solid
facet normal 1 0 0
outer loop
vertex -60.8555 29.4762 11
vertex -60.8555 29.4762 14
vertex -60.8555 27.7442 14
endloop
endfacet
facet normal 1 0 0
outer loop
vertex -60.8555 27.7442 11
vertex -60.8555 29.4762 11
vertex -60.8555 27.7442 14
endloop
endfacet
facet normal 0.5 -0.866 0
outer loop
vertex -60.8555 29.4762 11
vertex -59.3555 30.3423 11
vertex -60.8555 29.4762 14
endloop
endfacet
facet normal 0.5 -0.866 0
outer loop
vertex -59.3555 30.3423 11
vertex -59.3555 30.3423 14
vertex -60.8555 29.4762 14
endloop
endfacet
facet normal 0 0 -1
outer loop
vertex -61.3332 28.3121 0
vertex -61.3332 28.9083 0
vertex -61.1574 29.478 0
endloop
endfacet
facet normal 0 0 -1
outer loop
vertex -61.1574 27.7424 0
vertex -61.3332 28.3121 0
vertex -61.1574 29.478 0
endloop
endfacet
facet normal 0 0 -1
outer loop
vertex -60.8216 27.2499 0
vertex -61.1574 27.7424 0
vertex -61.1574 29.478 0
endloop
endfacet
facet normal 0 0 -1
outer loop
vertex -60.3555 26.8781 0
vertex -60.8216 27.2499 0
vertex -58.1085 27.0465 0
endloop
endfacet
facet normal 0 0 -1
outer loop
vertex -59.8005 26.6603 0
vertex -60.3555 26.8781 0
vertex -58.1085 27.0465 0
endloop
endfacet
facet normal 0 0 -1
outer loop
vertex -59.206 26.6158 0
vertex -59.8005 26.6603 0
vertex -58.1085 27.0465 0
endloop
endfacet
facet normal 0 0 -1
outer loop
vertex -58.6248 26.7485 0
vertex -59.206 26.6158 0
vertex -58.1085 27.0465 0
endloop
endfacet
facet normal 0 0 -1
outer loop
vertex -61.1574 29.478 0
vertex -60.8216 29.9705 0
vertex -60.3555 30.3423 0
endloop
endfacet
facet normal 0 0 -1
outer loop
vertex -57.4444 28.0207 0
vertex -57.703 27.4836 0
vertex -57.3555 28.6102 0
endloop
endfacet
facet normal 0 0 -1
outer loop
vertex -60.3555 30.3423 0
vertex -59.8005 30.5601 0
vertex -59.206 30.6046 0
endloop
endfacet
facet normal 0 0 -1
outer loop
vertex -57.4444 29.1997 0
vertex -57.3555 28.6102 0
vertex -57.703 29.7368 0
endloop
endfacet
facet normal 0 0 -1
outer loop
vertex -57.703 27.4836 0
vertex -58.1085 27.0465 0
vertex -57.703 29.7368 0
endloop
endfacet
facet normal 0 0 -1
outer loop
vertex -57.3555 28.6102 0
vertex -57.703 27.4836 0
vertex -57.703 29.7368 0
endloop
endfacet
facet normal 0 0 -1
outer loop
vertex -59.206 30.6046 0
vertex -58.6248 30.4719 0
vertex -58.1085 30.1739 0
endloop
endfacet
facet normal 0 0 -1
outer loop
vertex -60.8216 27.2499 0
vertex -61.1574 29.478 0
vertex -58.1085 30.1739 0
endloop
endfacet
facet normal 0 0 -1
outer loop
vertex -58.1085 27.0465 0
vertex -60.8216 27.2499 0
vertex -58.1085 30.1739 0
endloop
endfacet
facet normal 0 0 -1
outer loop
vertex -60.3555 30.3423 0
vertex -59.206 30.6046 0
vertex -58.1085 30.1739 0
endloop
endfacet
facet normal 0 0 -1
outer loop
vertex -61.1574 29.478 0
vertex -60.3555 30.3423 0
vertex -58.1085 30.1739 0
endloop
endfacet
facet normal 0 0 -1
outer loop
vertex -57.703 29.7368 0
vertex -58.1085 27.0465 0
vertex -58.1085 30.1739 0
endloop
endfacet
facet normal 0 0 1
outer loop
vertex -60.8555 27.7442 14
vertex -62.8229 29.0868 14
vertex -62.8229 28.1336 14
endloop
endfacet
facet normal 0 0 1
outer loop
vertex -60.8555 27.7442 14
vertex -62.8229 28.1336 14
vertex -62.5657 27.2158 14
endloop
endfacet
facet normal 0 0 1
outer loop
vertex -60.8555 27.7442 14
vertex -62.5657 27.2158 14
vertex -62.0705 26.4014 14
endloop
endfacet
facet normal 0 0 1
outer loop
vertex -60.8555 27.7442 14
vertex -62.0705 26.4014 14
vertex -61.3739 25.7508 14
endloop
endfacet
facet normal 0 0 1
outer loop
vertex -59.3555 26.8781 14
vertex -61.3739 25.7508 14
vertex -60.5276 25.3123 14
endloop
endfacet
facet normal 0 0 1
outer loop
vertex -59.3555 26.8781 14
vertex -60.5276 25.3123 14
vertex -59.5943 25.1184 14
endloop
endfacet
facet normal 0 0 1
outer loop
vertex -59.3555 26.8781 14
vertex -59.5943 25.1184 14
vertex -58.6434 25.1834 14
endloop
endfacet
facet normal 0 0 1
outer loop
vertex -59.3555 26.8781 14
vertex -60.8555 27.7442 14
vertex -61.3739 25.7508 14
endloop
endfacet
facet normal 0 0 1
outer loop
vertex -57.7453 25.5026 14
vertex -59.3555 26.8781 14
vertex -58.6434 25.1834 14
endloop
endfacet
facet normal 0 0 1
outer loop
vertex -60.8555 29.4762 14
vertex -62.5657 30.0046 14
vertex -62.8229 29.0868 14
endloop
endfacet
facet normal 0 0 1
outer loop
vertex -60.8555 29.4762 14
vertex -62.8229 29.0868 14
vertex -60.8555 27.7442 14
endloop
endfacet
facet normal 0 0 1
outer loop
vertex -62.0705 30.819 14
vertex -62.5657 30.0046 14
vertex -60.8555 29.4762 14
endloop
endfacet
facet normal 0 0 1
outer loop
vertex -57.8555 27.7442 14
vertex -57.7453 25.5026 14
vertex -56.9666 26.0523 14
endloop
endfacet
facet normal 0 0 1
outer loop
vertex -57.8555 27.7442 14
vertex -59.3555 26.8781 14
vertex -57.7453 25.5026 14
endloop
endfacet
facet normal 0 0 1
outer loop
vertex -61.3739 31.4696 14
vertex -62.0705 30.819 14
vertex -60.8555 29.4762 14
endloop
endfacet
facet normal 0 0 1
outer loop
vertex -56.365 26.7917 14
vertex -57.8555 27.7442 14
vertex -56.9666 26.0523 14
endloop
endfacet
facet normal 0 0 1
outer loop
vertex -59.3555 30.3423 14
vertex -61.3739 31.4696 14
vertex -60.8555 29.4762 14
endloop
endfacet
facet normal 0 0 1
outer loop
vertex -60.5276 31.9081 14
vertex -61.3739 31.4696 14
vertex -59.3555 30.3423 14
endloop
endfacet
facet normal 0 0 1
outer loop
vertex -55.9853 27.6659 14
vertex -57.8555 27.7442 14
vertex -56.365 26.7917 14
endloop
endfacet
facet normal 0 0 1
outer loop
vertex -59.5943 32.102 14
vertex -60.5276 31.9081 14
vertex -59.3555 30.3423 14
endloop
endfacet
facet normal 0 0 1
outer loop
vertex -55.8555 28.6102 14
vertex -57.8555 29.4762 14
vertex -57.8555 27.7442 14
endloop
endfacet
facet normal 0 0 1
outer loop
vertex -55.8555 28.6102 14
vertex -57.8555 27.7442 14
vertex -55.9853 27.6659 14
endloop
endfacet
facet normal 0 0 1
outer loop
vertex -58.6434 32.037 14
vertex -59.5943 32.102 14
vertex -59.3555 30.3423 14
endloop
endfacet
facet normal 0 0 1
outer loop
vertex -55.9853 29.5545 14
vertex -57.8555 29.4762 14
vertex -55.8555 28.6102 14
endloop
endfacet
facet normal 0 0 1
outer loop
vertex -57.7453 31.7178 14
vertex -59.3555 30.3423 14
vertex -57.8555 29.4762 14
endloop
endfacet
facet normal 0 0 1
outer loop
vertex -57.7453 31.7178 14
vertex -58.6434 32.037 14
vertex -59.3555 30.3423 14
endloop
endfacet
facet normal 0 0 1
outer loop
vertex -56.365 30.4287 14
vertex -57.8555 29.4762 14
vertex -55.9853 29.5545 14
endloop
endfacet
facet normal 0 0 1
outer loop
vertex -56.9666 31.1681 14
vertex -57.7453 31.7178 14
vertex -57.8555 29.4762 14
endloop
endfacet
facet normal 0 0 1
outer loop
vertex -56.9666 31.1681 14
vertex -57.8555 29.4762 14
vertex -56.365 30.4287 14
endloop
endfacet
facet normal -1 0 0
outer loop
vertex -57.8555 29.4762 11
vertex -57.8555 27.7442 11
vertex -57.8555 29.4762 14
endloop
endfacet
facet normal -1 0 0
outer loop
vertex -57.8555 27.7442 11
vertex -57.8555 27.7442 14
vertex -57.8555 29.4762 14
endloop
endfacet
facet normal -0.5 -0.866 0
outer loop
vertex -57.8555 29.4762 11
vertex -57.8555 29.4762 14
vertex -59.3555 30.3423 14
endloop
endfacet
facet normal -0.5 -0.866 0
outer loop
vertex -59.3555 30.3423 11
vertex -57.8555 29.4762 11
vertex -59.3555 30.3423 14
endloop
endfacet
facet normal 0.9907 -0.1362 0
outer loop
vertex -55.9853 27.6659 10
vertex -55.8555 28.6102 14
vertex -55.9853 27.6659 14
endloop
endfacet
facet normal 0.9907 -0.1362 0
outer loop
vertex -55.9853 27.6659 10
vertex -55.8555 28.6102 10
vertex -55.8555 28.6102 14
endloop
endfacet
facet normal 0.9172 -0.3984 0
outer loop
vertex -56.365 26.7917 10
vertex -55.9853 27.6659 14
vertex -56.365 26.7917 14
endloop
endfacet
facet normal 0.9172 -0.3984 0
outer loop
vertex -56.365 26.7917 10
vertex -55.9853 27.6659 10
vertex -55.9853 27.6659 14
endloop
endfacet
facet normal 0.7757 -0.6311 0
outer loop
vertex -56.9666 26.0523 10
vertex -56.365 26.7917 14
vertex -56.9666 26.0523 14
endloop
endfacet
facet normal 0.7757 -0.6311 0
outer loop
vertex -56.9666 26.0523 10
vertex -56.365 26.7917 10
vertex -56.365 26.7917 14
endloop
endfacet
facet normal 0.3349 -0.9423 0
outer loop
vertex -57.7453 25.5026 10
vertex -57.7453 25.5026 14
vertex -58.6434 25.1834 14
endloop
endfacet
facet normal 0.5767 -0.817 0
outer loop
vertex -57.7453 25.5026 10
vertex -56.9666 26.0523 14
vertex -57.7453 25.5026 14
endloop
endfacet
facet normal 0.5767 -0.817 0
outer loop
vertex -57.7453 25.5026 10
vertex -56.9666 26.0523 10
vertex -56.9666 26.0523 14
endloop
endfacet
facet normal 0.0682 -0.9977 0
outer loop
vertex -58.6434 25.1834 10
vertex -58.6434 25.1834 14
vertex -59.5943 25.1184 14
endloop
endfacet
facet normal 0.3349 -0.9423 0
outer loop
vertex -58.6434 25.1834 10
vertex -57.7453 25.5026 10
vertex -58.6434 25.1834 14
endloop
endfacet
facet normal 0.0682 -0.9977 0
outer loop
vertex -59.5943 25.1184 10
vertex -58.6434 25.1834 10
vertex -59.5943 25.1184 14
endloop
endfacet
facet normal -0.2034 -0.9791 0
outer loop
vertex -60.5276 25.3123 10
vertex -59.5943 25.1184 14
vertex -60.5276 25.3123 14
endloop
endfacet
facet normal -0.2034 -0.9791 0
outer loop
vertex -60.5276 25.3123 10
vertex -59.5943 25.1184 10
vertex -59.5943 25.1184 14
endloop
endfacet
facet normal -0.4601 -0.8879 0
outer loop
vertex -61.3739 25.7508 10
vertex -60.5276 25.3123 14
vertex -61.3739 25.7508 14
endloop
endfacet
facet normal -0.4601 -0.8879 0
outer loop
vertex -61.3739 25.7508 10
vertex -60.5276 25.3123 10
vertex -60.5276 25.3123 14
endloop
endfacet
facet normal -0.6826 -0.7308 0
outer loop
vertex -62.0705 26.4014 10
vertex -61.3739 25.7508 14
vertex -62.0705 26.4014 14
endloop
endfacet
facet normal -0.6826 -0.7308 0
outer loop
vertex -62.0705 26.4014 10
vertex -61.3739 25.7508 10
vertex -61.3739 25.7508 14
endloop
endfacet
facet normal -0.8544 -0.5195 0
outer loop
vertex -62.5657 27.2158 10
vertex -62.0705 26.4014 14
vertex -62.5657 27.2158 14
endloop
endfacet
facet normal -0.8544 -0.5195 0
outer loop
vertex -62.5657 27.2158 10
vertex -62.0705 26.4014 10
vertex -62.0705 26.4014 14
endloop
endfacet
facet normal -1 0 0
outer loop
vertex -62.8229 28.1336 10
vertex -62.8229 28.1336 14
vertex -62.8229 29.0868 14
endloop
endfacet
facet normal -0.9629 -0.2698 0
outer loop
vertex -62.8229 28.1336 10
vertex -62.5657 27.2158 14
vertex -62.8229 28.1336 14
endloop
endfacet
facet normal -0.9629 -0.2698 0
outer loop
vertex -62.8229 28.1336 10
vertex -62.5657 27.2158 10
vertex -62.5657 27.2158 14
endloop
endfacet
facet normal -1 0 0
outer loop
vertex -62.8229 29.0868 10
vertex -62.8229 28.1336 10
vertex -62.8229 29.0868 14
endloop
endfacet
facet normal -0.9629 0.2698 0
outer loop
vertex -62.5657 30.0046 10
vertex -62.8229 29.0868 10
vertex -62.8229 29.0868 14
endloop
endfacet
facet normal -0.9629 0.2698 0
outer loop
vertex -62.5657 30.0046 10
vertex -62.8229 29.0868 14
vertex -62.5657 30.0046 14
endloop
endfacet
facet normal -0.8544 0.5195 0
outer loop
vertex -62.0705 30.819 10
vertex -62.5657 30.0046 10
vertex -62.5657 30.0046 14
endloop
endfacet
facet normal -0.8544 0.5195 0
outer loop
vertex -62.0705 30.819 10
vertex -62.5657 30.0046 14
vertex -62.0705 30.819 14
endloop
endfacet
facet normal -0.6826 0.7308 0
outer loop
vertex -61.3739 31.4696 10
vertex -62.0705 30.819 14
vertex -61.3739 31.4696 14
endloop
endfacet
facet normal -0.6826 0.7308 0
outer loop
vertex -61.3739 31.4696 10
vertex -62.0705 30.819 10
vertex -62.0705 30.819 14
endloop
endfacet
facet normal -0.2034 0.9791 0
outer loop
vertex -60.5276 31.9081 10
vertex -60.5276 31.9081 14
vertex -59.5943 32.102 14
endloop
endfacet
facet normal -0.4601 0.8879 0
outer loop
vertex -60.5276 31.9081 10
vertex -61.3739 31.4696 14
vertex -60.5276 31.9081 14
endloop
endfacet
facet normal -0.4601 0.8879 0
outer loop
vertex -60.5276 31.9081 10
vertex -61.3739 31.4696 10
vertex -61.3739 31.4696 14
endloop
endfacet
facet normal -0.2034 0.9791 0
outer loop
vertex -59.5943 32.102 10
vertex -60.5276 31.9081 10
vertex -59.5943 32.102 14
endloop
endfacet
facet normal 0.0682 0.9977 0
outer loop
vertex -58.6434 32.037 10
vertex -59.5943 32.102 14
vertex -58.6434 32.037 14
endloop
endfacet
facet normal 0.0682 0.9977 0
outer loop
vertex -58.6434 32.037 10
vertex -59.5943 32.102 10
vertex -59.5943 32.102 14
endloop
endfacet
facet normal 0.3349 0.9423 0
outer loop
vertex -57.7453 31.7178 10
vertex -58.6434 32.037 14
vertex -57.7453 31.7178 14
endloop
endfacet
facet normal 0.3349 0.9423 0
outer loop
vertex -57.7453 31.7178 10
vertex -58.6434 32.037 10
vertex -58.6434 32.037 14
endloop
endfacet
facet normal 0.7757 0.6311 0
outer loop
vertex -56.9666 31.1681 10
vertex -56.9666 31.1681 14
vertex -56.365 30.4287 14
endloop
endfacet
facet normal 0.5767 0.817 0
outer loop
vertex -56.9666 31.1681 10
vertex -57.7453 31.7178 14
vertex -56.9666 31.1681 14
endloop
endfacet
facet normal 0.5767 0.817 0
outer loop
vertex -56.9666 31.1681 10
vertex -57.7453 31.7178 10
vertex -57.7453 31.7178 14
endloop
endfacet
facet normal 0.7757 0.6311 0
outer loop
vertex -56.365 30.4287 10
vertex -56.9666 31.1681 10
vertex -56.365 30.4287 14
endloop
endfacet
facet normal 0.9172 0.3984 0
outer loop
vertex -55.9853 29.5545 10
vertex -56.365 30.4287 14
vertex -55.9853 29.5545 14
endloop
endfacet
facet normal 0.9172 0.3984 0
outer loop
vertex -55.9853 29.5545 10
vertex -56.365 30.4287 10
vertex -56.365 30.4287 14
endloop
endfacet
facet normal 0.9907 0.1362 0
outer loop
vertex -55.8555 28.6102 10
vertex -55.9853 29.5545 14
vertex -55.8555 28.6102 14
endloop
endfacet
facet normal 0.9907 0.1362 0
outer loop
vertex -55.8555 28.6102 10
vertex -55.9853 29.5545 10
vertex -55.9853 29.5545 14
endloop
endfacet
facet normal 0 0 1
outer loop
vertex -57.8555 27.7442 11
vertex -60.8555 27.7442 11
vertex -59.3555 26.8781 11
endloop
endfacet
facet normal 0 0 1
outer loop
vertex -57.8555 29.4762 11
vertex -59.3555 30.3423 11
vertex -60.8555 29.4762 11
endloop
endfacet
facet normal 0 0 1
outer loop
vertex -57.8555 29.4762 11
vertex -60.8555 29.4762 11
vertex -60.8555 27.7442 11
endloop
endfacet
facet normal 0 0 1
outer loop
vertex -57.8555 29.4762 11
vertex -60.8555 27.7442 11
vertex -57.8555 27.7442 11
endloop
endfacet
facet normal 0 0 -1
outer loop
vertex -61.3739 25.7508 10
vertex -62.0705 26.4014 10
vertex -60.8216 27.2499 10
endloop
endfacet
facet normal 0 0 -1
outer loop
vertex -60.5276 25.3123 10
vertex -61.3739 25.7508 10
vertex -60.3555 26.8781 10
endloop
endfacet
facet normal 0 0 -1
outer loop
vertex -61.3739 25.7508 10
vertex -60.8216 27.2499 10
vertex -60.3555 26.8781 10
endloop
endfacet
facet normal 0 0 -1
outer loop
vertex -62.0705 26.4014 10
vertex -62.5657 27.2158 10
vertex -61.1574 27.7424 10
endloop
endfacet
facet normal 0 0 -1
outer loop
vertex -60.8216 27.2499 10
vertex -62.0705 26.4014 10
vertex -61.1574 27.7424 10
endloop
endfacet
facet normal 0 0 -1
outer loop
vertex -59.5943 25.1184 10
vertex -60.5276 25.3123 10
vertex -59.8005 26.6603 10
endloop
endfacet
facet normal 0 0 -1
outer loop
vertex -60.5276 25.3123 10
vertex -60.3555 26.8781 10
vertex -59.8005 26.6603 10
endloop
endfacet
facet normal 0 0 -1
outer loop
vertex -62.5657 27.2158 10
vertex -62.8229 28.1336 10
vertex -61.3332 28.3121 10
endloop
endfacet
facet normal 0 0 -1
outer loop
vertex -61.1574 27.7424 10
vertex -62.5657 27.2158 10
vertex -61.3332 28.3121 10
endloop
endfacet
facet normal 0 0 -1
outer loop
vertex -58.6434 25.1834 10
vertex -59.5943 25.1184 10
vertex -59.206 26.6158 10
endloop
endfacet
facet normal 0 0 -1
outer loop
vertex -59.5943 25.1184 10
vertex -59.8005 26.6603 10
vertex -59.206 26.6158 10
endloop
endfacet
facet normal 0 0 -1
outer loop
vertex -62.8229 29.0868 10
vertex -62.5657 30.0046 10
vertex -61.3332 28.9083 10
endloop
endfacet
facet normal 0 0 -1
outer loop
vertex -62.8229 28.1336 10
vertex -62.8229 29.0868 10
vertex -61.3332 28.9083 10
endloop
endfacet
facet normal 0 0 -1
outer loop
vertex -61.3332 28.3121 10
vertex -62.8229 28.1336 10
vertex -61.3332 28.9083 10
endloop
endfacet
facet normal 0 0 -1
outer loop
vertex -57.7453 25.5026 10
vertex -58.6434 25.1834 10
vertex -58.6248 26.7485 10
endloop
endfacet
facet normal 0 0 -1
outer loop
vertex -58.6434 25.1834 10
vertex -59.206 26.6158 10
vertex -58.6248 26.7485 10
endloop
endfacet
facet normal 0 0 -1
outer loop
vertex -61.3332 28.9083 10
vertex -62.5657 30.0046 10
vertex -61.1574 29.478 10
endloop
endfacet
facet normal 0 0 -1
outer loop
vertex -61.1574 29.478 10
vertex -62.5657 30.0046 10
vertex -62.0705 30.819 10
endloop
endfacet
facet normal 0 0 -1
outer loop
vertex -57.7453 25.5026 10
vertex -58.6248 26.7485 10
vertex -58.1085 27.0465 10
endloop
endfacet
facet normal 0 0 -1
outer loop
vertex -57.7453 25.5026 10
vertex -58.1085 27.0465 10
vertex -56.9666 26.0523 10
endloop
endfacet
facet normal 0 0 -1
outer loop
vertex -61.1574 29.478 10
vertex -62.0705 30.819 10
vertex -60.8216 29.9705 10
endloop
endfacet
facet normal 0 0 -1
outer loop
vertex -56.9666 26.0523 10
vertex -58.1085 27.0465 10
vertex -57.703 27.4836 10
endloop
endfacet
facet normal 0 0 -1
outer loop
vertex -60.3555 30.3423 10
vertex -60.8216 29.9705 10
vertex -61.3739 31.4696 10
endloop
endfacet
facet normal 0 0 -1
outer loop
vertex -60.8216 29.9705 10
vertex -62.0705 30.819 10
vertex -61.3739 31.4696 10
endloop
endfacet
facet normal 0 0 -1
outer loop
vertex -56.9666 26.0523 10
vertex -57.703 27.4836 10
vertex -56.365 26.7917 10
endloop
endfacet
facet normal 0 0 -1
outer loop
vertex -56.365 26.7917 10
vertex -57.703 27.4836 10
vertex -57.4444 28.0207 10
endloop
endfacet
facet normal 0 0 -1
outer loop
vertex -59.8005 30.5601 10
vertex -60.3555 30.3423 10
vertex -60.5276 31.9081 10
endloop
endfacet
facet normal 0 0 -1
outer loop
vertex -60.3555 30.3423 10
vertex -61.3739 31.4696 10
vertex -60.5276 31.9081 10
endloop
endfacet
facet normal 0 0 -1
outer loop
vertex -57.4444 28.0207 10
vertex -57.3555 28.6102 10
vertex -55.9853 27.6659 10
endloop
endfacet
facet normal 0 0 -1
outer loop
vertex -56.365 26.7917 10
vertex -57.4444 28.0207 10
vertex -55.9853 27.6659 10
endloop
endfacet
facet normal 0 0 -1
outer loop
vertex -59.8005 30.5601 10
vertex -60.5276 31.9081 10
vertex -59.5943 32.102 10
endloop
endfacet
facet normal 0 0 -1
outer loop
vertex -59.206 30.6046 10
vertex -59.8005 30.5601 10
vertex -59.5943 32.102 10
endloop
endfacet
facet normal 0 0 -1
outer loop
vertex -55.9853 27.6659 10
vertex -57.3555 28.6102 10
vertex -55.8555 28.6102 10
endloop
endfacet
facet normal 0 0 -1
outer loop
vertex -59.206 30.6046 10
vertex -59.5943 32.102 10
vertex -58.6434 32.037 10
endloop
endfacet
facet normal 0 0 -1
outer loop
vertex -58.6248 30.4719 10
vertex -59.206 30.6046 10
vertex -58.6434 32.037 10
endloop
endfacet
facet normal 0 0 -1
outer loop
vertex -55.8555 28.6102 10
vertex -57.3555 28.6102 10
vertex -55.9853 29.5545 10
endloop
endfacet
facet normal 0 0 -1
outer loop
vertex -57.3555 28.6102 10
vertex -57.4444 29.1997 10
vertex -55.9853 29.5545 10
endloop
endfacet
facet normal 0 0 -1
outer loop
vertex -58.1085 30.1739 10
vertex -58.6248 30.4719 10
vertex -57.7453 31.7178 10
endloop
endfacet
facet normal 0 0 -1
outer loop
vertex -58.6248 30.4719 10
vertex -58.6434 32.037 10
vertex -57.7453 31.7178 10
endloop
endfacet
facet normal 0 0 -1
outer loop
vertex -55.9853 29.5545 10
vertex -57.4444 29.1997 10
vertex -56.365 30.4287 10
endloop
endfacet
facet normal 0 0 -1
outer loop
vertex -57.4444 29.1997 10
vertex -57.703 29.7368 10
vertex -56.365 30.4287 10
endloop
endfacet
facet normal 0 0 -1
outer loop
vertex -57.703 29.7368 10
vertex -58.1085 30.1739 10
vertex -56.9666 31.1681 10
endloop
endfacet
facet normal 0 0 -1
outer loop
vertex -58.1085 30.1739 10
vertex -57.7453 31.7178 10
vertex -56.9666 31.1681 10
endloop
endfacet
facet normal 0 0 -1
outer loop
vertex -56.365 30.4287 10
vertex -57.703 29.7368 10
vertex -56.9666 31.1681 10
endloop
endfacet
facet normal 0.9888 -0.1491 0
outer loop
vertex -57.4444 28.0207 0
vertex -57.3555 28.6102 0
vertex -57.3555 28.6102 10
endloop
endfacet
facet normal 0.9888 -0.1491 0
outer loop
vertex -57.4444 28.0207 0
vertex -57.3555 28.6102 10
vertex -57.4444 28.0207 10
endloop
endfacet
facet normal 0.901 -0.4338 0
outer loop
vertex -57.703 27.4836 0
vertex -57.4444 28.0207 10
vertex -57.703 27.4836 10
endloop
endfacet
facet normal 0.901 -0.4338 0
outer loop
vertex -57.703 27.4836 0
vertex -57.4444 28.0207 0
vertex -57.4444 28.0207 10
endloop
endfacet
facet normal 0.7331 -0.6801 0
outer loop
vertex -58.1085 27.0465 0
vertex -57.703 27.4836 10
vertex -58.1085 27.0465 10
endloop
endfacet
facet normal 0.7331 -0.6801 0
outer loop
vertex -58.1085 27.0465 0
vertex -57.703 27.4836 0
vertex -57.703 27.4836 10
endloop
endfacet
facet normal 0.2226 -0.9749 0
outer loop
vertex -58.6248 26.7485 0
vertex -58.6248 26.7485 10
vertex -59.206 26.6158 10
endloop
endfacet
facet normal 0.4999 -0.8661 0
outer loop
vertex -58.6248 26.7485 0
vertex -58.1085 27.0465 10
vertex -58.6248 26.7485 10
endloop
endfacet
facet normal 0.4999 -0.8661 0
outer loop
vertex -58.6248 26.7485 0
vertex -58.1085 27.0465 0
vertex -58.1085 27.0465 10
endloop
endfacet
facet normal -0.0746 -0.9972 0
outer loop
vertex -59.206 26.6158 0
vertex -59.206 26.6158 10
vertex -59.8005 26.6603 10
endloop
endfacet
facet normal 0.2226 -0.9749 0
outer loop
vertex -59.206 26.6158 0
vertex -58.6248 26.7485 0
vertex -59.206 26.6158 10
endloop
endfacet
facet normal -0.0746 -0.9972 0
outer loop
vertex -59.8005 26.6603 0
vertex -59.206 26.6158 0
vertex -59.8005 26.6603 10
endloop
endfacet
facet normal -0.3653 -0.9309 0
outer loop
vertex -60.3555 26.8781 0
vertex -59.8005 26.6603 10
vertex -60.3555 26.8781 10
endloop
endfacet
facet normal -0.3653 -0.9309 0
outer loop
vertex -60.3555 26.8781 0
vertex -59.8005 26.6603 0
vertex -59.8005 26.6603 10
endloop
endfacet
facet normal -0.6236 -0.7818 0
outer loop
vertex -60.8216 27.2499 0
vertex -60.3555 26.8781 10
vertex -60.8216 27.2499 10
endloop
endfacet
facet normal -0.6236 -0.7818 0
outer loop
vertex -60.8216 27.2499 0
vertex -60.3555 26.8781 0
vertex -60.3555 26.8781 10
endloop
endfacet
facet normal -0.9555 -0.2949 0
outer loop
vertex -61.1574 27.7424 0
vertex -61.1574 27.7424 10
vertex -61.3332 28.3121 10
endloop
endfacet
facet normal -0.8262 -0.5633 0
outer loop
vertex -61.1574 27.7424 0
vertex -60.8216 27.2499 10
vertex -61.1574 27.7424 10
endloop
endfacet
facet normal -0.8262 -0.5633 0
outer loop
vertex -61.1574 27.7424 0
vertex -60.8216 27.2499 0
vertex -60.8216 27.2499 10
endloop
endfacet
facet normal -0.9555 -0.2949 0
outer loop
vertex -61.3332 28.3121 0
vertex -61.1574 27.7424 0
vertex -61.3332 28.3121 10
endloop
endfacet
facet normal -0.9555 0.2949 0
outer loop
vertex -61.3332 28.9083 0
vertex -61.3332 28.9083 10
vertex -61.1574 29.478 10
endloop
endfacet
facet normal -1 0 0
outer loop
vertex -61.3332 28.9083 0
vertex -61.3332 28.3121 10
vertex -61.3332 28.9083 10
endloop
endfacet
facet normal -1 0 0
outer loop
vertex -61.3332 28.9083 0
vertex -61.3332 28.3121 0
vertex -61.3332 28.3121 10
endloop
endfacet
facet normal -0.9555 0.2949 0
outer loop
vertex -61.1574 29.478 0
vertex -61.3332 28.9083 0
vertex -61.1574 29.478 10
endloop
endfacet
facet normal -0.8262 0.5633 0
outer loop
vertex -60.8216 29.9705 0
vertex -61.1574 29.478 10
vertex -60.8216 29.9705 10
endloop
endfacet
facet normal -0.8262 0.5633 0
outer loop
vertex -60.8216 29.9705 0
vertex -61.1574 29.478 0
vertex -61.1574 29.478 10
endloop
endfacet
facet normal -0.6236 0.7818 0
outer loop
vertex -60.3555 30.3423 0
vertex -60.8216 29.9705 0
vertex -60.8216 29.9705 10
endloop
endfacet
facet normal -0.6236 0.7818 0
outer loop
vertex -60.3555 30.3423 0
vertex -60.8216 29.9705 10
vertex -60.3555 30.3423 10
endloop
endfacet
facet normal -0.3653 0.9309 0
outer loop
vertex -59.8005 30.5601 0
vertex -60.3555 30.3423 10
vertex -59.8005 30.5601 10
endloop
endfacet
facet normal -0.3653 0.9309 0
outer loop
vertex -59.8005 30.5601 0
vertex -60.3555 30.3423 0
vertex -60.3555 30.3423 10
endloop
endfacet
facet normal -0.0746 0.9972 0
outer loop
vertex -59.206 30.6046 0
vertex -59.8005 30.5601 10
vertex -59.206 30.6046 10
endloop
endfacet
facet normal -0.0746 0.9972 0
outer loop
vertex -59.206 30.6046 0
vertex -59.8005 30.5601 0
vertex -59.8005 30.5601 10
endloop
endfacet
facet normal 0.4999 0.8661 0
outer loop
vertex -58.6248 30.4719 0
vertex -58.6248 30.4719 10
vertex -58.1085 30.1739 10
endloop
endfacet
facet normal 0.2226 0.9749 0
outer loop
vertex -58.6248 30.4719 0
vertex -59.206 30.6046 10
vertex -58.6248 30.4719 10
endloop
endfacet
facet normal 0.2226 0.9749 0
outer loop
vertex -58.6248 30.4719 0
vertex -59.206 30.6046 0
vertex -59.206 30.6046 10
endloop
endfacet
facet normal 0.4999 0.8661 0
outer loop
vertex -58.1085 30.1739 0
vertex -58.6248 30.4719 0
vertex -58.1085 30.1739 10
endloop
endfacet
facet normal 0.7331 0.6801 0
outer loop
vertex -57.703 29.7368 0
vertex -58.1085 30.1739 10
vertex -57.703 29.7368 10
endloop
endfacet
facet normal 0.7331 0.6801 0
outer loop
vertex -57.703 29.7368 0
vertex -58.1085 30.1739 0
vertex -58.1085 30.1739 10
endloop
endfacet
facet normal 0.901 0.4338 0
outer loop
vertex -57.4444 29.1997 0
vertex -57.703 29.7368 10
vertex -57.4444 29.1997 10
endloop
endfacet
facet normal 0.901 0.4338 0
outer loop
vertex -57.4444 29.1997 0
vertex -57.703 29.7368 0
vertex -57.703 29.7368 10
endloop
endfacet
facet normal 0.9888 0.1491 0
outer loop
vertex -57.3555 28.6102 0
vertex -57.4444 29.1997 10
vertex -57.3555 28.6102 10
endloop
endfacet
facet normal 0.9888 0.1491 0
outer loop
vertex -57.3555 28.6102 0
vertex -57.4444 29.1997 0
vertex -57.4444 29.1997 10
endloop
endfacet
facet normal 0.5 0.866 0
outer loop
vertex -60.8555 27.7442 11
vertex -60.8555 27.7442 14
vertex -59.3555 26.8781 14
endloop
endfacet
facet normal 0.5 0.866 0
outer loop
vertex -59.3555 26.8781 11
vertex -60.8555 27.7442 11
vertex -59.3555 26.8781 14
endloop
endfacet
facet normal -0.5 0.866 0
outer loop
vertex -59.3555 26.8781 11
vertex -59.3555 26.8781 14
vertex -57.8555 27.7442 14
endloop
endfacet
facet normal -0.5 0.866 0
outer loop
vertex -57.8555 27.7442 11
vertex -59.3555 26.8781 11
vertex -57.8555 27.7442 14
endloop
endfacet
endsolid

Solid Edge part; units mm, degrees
sketch "Sketch1" plane through (0, 0, 0) normal (0, 0, 1) x (1, 0, 0)
  circle A0 centre (-59.3555, 28.6102) radius 2
  dimension "D1" = 4
extrude "Protrusion1" add sketch "Sketch1" along normal blind 10
sketch "Sketch2" plane through (-59.3555, 28.6102, 10) normal (0, 0, 1) x (1, 0, 0)
  circle A0 centre (0, 0) radius 3.5
  dimension "D1" = 7
extrude "kopdia7x4" add sketch "Sketch2" along normal blind 4
cosmetic_thread "Thread1" size "M4"
sketch "Sketch3" plane through (-59.3555, 28.6102, 14) normal (0, 0, 1) x (1, 0, 0)
  line L0 (-1.5, 0.866) -> (-1.5, -0.866)
  line L1 (-1.5, -0.866) -> (0, -1.7321)
  line L2 (0, -1.7321) -> (1.5, -0.866)
  line L3 (1.5, -0.866) -> (1.5, 0.866)
  line L4 (1.5, 0.866) -> (0, 1.7321)
  line L5 (0, 1.7321) -> (-1.5, 0.866)
  dimension "D1" = 3
extrude "zeskant" cut sketch "Sketch3" against normal blind 3
